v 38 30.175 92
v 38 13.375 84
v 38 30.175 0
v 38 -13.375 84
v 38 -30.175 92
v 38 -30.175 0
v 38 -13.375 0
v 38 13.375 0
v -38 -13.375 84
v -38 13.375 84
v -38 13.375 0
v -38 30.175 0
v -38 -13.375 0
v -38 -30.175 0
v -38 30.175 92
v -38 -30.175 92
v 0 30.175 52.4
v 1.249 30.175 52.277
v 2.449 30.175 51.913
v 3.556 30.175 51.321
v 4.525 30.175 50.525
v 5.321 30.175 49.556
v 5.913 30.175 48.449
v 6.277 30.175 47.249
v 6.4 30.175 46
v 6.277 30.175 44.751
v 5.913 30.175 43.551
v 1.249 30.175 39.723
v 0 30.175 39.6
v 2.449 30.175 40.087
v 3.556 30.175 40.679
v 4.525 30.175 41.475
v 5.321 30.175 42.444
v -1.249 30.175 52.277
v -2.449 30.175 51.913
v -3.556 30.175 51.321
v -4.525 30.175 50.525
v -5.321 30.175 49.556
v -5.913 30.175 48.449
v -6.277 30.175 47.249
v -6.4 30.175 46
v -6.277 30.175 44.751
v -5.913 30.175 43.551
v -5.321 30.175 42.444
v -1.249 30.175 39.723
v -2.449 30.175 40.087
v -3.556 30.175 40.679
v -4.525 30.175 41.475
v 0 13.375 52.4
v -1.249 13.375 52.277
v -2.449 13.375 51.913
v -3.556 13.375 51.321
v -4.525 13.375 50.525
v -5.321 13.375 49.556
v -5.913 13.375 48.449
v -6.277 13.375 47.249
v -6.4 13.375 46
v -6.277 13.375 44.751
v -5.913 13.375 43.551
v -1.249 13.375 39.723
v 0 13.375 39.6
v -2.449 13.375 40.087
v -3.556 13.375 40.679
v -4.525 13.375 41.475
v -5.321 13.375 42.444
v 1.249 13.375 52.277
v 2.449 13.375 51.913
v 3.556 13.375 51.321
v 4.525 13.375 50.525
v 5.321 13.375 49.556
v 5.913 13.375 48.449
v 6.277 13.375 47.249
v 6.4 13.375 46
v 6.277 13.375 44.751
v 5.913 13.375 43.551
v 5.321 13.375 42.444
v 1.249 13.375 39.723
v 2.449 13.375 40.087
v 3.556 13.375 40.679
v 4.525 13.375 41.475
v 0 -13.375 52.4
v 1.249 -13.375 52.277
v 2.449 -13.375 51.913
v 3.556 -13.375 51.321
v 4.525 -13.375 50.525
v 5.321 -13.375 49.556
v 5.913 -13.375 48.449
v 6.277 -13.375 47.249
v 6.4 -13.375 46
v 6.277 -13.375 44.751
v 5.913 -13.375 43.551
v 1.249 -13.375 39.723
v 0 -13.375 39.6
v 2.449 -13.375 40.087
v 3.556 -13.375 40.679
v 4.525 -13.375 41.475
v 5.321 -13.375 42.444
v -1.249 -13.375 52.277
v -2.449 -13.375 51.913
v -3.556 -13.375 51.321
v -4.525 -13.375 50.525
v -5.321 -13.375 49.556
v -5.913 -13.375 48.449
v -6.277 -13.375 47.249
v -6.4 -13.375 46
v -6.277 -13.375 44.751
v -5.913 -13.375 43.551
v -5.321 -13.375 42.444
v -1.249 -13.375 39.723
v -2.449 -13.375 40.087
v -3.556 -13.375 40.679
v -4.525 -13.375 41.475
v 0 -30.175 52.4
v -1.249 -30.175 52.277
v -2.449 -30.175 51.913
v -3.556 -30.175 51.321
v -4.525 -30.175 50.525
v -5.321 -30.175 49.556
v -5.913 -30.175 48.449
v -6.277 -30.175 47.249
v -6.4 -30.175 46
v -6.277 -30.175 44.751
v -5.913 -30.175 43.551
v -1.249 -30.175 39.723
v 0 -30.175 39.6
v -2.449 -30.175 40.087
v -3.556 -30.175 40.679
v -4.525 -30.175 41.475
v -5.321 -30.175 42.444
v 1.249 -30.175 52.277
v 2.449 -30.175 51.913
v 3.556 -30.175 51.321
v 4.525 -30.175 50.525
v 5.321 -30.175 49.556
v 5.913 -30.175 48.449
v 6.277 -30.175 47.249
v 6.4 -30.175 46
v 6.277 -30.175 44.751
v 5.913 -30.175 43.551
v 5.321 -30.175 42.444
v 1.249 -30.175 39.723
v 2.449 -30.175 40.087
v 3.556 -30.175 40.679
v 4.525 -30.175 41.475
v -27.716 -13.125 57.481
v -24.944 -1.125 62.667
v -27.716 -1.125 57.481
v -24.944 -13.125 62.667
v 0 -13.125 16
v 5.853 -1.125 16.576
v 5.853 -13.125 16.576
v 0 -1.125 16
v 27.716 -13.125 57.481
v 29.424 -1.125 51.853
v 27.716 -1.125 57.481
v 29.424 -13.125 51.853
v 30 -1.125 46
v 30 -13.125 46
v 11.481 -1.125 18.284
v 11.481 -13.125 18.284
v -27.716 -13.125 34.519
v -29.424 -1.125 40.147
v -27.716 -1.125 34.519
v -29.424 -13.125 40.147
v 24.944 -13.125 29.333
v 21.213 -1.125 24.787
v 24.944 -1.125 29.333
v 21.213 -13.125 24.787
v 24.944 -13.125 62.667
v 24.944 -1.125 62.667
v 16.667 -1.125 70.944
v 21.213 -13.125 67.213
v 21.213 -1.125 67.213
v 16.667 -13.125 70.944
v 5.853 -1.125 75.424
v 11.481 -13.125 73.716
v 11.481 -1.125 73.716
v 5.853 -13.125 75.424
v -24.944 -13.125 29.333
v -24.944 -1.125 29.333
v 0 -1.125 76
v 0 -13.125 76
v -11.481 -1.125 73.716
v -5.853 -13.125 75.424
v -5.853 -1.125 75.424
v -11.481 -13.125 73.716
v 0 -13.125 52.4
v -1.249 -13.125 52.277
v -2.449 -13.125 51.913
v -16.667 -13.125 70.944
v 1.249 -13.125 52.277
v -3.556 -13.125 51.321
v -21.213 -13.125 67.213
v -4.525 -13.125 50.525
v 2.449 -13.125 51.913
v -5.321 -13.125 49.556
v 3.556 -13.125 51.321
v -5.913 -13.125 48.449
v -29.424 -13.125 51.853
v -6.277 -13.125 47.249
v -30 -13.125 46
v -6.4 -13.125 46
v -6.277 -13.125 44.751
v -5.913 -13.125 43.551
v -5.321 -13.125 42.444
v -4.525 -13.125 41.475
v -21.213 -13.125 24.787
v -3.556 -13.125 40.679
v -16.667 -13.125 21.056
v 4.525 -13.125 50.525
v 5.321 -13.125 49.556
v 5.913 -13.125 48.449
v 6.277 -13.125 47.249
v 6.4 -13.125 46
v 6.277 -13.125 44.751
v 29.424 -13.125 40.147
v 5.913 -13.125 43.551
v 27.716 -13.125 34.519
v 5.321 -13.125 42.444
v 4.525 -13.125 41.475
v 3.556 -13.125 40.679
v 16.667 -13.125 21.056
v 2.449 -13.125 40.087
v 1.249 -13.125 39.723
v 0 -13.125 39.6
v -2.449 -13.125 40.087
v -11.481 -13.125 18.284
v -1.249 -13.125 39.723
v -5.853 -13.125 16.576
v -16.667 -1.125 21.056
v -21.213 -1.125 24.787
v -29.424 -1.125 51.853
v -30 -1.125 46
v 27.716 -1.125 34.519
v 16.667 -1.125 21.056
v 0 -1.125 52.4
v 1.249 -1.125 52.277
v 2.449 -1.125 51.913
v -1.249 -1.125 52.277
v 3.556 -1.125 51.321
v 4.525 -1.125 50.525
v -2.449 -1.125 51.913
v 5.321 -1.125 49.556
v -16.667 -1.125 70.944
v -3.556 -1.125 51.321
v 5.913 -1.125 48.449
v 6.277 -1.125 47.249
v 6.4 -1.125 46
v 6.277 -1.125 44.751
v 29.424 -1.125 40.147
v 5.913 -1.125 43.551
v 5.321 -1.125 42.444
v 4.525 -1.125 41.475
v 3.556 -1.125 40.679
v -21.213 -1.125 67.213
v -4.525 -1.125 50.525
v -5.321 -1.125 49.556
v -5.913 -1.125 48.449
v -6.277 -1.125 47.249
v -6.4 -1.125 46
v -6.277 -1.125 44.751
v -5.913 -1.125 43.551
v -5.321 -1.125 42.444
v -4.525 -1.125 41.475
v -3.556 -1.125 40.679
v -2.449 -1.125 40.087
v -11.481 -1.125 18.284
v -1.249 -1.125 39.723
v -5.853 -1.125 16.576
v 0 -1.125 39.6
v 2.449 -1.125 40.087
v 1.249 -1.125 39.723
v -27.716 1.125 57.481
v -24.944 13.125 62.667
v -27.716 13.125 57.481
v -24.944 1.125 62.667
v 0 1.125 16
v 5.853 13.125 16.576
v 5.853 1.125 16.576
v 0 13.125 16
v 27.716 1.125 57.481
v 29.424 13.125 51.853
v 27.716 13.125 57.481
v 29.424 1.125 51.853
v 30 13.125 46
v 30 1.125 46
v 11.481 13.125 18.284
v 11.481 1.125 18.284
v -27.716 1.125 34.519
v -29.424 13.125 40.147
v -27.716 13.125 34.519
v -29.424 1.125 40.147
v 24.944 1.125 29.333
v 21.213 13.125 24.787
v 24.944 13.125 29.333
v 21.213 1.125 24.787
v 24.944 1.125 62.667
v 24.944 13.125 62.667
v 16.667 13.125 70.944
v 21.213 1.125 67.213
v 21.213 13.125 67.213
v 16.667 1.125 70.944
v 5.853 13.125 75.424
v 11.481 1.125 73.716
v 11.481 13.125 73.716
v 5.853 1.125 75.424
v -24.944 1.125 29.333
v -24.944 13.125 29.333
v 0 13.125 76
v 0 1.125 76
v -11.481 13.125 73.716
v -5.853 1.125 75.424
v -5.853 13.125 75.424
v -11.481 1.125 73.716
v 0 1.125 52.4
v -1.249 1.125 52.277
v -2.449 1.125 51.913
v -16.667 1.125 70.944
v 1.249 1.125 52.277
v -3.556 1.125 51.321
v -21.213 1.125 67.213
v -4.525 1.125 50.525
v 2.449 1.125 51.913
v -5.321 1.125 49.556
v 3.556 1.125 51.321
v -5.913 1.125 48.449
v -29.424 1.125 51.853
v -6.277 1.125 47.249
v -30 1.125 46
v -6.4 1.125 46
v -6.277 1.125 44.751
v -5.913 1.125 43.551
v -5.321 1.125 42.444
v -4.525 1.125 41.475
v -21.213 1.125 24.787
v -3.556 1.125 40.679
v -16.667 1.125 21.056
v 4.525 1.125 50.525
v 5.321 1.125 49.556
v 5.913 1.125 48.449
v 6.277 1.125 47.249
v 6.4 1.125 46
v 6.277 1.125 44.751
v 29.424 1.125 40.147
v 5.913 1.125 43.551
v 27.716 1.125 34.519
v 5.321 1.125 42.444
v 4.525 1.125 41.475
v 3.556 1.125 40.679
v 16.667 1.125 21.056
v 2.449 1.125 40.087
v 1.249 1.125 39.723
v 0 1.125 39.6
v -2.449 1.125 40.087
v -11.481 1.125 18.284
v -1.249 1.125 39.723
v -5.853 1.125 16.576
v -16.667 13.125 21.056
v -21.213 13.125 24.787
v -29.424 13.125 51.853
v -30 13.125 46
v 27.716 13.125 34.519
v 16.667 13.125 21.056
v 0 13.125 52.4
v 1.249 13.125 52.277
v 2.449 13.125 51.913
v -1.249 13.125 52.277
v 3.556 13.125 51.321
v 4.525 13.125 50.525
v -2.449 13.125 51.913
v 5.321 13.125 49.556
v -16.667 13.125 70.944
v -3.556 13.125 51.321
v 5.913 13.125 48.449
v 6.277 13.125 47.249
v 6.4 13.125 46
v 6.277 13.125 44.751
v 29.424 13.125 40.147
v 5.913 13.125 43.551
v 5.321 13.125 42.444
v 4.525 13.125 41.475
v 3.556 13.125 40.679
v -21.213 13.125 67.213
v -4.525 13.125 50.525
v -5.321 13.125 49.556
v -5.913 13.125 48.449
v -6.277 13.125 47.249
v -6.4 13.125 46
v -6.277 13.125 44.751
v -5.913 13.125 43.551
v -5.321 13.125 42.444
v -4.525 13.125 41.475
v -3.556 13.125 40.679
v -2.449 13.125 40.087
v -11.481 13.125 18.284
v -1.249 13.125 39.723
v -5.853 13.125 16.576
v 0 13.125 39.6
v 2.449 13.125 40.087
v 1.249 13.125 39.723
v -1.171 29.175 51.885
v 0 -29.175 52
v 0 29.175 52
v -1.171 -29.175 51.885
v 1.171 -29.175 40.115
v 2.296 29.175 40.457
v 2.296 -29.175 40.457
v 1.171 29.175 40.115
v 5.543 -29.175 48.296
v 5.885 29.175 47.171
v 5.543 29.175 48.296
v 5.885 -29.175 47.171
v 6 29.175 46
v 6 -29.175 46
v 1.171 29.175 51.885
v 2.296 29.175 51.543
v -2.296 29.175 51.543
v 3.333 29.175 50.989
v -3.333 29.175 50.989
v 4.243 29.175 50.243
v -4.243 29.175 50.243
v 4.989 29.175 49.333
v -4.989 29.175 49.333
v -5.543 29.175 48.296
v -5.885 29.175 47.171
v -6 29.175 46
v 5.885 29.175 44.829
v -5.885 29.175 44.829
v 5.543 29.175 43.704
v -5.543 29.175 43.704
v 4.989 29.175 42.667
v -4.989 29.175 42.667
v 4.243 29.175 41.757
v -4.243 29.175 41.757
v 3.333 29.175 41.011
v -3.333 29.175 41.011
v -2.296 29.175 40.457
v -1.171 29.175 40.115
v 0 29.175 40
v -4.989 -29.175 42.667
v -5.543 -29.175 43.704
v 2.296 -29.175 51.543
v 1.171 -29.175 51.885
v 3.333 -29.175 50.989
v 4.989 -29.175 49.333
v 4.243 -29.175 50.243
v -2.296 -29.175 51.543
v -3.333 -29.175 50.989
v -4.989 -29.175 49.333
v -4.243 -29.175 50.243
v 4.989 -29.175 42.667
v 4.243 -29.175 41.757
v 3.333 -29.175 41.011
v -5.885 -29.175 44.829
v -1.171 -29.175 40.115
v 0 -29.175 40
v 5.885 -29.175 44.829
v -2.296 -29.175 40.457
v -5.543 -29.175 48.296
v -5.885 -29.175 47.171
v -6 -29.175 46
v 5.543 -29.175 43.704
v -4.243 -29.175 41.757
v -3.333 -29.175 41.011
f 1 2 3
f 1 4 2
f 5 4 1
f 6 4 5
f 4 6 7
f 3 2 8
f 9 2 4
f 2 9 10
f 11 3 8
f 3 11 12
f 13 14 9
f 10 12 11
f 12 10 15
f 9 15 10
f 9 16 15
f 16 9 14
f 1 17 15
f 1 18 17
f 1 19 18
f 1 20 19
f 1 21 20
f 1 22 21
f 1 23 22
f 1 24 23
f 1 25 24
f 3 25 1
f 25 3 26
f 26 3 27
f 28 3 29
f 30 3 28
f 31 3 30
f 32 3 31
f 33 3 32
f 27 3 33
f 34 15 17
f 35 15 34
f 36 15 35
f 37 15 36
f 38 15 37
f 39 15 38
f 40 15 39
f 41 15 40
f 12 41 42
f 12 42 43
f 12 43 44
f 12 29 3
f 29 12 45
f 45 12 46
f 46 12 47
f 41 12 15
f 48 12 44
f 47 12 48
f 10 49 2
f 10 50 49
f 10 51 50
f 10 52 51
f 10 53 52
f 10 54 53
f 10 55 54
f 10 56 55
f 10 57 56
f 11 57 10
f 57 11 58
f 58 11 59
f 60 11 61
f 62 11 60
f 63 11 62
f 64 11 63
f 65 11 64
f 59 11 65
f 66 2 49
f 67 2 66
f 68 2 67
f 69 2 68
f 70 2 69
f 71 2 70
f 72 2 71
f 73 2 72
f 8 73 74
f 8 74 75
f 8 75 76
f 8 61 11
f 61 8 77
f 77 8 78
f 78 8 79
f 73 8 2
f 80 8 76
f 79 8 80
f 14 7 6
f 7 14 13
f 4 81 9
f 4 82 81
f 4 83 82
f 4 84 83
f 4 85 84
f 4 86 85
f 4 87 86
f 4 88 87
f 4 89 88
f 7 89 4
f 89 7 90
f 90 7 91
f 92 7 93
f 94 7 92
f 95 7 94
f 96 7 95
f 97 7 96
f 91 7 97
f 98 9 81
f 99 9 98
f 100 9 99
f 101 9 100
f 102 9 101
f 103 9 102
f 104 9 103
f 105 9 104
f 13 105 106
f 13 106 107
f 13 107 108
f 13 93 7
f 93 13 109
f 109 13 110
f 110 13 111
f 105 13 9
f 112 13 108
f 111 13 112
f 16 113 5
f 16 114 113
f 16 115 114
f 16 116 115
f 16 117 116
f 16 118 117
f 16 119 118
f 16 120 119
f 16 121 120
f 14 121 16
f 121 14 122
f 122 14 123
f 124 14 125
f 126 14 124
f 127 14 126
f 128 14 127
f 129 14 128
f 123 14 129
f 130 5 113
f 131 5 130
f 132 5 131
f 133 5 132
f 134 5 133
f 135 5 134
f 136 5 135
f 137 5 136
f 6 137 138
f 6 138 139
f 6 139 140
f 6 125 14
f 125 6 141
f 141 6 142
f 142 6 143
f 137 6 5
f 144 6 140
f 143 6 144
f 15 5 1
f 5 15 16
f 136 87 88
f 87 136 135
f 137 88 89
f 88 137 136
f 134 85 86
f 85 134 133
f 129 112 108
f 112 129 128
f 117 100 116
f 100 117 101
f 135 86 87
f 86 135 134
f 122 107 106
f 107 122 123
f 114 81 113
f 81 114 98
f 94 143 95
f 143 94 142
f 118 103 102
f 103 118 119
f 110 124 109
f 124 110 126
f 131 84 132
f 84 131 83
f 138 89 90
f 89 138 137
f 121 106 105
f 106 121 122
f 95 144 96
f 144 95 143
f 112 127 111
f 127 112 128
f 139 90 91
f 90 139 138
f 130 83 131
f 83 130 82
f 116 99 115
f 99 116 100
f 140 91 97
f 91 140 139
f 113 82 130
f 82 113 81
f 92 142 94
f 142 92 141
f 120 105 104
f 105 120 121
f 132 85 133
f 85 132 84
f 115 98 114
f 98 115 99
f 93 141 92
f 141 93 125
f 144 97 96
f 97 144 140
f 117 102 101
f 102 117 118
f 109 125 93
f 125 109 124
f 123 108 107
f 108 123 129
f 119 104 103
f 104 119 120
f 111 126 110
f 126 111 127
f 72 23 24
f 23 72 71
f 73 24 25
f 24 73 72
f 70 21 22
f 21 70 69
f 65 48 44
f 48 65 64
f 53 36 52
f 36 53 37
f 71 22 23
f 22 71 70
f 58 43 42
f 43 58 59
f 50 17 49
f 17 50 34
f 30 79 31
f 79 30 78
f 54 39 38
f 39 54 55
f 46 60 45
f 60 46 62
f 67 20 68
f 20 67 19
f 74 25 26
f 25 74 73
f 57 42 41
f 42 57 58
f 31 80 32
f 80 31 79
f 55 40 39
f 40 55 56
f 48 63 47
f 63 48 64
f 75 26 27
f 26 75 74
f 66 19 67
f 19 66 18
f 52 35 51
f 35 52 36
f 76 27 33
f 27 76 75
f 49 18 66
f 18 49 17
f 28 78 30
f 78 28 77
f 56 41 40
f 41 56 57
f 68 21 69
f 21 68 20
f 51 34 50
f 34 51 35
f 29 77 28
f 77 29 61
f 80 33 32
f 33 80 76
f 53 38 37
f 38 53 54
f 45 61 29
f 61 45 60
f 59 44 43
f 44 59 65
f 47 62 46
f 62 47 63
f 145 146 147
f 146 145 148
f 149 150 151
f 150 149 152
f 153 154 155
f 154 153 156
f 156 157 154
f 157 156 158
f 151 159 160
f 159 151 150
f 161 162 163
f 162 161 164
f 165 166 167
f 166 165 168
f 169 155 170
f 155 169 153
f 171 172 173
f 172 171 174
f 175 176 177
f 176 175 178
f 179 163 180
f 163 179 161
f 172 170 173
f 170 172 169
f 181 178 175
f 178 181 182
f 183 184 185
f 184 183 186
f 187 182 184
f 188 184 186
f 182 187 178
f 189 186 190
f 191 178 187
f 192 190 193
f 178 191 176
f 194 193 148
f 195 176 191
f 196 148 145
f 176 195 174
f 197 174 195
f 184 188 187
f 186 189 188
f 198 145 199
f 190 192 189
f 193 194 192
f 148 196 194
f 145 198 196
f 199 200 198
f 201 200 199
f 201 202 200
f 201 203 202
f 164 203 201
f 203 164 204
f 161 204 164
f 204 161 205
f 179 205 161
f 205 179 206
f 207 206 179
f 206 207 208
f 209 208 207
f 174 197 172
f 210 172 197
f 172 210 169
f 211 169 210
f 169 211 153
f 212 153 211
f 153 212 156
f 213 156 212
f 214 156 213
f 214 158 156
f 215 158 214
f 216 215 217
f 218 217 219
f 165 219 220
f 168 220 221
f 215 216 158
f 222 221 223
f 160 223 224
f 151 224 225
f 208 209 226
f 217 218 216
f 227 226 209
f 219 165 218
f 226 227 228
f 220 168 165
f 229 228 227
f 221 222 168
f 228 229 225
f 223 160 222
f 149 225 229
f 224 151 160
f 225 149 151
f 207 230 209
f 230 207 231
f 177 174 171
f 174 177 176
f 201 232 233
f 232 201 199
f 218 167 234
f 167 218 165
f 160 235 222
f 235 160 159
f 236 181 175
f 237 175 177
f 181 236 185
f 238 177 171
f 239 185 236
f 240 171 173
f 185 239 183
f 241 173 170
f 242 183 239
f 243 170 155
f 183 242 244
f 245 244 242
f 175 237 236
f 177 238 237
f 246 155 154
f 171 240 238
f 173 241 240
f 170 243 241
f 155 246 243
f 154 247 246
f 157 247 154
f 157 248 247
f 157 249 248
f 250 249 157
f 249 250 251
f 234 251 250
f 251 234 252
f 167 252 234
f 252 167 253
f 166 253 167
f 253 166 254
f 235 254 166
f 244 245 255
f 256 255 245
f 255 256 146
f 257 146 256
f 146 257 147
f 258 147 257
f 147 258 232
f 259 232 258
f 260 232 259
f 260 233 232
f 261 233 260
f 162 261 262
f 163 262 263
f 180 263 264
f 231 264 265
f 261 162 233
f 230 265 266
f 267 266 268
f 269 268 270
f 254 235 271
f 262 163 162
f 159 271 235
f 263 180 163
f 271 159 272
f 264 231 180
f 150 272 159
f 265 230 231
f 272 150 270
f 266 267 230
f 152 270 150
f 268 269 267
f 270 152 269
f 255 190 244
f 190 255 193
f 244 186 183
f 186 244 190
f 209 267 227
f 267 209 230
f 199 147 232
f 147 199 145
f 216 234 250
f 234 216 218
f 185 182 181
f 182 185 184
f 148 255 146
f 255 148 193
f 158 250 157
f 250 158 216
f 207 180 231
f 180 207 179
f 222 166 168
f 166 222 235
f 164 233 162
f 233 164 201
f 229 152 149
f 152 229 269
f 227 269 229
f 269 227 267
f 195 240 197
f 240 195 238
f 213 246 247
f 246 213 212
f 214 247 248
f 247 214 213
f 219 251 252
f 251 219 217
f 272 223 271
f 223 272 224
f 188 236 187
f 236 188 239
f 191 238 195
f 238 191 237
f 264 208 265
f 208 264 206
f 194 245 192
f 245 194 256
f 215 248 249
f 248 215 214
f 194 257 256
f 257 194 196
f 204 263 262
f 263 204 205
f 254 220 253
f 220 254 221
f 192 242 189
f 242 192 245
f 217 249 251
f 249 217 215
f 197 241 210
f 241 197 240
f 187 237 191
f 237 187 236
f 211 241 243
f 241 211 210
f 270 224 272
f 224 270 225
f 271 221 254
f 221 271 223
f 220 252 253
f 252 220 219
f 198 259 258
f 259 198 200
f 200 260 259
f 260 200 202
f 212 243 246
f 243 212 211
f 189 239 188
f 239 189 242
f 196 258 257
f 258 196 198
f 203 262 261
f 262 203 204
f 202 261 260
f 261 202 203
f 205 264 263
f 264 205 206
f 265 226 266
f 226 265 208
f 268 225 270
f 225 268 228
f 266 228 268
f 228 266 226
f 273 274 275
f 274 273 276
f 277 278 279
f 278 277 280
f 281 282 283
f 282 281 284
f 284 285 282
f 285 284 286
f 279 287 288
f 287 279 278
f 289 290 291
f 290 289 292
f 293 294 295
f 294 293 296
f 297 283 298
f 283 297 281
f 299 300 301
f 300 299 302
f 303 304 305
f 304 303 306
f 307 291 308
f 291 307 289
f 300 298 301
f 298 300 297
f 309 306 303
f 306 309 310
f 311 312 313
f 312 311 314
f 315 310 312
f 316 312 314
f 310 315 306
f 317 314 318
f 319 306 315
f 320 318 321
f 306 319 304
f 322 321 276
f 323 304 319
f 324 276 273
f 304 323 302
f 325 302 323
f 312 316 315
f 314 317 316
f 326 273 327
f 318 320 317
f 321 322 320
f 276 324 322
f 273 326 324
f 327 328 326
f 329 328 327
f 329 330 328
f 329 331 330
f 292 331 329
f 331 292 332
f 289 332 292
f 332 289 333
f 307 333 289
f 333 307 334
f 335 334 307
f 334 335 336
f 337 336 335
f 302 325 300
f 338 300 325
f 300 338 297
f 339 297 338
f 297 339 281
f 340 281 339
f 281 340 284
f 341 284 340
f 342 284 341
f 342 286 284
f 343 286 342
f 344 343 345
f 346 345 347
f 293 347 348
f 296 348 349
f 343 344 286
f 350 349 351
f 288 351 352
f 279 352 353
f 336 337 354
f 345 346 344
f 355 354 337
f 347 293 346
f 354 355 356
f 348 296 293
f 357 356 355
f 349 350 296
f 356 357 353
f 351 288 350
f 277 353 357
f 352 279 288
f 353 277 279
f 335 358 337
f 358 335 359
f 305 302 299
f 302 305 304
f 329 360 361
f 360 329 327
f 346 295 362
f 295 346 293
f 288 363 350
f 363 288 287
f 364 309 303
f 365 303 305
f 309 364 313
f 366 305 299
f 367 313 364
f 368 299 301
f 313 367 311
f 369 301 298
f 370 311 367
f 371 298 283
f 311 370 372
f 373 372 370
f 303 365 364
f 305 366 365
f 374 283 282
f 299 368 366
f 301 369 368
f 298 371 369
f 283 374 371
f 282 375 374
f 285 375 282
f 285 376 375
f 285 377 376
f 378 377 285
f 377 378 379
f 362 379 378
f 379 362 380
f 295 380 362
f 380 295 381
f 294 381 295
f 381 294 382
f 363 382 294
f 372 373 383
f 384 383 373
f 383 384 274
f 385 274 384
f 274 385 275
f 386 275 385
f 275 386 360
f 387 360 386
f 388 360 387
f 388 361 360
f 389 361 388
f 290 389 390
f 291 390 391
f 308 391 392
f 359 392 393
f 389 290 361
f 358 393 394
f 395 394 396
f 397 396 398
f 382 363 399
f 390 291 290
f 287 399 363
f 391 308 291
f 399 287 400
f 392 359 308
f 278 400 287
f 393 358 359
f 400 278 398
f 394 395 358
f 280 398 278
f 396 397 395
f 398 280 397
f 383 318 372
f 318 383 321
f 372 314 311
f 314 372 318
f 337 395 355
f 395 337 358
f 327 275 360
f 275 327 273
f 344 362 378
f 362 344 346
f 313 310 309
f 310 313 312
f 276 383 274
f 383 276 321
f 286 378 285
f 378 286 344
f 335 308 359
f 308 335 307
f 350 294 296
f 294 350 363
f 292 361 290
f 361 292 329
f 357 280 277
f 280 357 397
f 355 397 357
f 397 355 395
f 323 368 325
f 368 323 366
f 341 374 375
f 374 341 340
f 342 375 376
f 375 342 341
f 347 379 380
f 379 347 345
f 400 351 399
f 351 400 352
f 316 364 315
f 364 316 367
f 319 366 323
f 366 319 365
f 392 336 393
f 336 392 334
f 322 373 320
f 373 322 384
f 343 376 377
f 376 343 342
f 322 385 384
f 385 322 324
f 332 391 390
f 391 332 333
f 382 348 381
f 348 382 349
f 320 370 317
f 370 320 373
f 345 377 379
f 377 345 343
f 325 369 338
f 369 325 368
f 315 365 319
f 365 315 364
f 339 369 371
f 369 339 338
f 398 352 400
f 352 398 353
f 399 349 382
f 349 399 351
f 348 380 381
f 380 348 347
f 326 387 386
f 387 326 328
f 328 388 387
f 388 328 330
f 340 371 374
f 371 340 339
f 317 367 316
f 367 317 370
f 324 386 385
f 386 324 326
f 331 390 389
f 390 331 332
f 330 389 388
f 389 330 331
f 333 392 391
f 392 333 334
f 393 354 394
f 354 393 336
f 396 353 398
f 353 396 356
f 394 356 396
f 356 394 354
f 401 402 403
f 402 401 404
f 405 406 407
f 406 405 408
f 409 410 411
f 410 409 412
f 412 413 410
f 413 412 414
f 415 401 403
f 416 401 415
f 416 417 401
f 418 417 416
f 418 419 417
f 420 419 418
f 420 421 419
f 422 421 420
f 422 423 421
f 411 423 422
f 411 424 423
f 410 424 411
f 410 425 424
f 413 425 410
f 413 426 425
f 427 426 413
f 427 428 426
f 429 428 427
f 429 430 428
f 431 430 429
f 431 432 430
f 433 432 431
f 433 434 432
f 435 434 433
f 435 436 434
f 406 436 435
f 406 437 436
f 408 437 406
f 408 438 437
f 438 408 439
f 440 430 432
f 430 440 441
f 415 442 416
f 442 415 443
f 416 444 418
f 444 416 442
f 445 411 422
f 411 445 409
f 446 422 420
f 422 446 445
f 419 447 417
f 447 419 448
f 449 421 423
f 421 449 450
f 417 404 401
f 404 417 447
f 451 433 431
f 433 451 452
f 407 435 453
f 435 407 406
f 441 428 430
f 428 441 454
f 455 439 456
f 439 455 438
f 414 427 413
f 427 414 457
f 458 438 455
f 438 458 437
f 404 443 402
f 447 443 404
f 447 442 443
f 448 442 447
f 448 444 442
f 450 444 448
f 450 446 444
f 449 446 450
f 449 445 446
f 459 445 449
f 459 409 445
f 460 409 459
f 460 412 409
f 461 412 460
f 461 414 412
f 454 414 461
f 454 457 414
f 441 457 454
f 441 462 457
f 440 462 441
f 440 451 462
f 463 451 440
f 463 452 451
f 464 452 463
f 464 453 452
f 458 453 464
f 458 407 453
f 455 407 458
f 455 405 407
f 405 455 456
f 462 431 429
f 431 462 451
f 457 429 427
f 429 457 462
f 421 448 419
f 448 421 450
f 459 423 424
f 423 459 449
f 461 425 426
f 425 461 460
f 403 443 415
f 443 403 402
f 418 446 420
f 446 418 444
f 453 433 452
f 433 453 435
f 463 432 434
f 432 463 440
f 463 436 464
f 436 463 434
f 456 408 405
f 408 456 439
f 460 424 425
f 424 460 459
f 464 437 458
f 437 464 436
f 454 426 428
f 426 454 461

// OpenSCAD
$fn = 32;

// ------------------------------------------------------------------------
// Trolley wheel set: wheels d60, fork 84 mm tall
// Every part is its own module, assembly() places every instance.
// ------------------------------------------------------------------------

// --- part 1 ---
module trolley_fork() {
  difference() {
    union() {
      translate([-38, 13.375, 0]) cube([76, 16.8, 84]);
      translate([-38, -30.175, 0]) cube([76, 16.8, 84]);
      translate([-38, -30.175, 84]) cube([76, 60.35, 8]);
    }
    translate([0, -21.775, 46]) rotate([90, 0, 0]) cylinder(h = 18.8, d = 12.8, center = true);
    translate([0, 21.775, 46]) rotate([90, 0, 0]) cylinder(h = 18.8, d = 12.8, center = true);
  }
}

// --- part 2 ---
module trolley_wheel() {
  difference() {
      translate([0, 0, 0]) cylinder(h = 12, d = 60);
      translate([0, 0, -1]) cylinder(h = 14, d = 12.8);
    }
}

// --- part 3 ---
module trolley_axle() {
  translate([0, 0, -29.175]) cylinder(h = 58.35, d = 12);
}

// --- assembly ---
module assembly() {
  color([0.80, 0.24, 0.20]) translate([0, 0, 0]) rotate([0, 0, 0]) trolley_fork();
  color([0.20, 0.45, 0.75]) translate([0, -1.125, 46]) rotate([90, 0, 0]) trolley_wheel();
  color([0.25, 0.62, 0.32]) translate([0, 13.125, 46]) rotate([90, 0, 0]) trolley_wheel();
  color([0.92, 0.70, 0.18]) translate([0, 0, 46]) rotate([90, 0, 0]) trolley_axle();
}

assembly();
